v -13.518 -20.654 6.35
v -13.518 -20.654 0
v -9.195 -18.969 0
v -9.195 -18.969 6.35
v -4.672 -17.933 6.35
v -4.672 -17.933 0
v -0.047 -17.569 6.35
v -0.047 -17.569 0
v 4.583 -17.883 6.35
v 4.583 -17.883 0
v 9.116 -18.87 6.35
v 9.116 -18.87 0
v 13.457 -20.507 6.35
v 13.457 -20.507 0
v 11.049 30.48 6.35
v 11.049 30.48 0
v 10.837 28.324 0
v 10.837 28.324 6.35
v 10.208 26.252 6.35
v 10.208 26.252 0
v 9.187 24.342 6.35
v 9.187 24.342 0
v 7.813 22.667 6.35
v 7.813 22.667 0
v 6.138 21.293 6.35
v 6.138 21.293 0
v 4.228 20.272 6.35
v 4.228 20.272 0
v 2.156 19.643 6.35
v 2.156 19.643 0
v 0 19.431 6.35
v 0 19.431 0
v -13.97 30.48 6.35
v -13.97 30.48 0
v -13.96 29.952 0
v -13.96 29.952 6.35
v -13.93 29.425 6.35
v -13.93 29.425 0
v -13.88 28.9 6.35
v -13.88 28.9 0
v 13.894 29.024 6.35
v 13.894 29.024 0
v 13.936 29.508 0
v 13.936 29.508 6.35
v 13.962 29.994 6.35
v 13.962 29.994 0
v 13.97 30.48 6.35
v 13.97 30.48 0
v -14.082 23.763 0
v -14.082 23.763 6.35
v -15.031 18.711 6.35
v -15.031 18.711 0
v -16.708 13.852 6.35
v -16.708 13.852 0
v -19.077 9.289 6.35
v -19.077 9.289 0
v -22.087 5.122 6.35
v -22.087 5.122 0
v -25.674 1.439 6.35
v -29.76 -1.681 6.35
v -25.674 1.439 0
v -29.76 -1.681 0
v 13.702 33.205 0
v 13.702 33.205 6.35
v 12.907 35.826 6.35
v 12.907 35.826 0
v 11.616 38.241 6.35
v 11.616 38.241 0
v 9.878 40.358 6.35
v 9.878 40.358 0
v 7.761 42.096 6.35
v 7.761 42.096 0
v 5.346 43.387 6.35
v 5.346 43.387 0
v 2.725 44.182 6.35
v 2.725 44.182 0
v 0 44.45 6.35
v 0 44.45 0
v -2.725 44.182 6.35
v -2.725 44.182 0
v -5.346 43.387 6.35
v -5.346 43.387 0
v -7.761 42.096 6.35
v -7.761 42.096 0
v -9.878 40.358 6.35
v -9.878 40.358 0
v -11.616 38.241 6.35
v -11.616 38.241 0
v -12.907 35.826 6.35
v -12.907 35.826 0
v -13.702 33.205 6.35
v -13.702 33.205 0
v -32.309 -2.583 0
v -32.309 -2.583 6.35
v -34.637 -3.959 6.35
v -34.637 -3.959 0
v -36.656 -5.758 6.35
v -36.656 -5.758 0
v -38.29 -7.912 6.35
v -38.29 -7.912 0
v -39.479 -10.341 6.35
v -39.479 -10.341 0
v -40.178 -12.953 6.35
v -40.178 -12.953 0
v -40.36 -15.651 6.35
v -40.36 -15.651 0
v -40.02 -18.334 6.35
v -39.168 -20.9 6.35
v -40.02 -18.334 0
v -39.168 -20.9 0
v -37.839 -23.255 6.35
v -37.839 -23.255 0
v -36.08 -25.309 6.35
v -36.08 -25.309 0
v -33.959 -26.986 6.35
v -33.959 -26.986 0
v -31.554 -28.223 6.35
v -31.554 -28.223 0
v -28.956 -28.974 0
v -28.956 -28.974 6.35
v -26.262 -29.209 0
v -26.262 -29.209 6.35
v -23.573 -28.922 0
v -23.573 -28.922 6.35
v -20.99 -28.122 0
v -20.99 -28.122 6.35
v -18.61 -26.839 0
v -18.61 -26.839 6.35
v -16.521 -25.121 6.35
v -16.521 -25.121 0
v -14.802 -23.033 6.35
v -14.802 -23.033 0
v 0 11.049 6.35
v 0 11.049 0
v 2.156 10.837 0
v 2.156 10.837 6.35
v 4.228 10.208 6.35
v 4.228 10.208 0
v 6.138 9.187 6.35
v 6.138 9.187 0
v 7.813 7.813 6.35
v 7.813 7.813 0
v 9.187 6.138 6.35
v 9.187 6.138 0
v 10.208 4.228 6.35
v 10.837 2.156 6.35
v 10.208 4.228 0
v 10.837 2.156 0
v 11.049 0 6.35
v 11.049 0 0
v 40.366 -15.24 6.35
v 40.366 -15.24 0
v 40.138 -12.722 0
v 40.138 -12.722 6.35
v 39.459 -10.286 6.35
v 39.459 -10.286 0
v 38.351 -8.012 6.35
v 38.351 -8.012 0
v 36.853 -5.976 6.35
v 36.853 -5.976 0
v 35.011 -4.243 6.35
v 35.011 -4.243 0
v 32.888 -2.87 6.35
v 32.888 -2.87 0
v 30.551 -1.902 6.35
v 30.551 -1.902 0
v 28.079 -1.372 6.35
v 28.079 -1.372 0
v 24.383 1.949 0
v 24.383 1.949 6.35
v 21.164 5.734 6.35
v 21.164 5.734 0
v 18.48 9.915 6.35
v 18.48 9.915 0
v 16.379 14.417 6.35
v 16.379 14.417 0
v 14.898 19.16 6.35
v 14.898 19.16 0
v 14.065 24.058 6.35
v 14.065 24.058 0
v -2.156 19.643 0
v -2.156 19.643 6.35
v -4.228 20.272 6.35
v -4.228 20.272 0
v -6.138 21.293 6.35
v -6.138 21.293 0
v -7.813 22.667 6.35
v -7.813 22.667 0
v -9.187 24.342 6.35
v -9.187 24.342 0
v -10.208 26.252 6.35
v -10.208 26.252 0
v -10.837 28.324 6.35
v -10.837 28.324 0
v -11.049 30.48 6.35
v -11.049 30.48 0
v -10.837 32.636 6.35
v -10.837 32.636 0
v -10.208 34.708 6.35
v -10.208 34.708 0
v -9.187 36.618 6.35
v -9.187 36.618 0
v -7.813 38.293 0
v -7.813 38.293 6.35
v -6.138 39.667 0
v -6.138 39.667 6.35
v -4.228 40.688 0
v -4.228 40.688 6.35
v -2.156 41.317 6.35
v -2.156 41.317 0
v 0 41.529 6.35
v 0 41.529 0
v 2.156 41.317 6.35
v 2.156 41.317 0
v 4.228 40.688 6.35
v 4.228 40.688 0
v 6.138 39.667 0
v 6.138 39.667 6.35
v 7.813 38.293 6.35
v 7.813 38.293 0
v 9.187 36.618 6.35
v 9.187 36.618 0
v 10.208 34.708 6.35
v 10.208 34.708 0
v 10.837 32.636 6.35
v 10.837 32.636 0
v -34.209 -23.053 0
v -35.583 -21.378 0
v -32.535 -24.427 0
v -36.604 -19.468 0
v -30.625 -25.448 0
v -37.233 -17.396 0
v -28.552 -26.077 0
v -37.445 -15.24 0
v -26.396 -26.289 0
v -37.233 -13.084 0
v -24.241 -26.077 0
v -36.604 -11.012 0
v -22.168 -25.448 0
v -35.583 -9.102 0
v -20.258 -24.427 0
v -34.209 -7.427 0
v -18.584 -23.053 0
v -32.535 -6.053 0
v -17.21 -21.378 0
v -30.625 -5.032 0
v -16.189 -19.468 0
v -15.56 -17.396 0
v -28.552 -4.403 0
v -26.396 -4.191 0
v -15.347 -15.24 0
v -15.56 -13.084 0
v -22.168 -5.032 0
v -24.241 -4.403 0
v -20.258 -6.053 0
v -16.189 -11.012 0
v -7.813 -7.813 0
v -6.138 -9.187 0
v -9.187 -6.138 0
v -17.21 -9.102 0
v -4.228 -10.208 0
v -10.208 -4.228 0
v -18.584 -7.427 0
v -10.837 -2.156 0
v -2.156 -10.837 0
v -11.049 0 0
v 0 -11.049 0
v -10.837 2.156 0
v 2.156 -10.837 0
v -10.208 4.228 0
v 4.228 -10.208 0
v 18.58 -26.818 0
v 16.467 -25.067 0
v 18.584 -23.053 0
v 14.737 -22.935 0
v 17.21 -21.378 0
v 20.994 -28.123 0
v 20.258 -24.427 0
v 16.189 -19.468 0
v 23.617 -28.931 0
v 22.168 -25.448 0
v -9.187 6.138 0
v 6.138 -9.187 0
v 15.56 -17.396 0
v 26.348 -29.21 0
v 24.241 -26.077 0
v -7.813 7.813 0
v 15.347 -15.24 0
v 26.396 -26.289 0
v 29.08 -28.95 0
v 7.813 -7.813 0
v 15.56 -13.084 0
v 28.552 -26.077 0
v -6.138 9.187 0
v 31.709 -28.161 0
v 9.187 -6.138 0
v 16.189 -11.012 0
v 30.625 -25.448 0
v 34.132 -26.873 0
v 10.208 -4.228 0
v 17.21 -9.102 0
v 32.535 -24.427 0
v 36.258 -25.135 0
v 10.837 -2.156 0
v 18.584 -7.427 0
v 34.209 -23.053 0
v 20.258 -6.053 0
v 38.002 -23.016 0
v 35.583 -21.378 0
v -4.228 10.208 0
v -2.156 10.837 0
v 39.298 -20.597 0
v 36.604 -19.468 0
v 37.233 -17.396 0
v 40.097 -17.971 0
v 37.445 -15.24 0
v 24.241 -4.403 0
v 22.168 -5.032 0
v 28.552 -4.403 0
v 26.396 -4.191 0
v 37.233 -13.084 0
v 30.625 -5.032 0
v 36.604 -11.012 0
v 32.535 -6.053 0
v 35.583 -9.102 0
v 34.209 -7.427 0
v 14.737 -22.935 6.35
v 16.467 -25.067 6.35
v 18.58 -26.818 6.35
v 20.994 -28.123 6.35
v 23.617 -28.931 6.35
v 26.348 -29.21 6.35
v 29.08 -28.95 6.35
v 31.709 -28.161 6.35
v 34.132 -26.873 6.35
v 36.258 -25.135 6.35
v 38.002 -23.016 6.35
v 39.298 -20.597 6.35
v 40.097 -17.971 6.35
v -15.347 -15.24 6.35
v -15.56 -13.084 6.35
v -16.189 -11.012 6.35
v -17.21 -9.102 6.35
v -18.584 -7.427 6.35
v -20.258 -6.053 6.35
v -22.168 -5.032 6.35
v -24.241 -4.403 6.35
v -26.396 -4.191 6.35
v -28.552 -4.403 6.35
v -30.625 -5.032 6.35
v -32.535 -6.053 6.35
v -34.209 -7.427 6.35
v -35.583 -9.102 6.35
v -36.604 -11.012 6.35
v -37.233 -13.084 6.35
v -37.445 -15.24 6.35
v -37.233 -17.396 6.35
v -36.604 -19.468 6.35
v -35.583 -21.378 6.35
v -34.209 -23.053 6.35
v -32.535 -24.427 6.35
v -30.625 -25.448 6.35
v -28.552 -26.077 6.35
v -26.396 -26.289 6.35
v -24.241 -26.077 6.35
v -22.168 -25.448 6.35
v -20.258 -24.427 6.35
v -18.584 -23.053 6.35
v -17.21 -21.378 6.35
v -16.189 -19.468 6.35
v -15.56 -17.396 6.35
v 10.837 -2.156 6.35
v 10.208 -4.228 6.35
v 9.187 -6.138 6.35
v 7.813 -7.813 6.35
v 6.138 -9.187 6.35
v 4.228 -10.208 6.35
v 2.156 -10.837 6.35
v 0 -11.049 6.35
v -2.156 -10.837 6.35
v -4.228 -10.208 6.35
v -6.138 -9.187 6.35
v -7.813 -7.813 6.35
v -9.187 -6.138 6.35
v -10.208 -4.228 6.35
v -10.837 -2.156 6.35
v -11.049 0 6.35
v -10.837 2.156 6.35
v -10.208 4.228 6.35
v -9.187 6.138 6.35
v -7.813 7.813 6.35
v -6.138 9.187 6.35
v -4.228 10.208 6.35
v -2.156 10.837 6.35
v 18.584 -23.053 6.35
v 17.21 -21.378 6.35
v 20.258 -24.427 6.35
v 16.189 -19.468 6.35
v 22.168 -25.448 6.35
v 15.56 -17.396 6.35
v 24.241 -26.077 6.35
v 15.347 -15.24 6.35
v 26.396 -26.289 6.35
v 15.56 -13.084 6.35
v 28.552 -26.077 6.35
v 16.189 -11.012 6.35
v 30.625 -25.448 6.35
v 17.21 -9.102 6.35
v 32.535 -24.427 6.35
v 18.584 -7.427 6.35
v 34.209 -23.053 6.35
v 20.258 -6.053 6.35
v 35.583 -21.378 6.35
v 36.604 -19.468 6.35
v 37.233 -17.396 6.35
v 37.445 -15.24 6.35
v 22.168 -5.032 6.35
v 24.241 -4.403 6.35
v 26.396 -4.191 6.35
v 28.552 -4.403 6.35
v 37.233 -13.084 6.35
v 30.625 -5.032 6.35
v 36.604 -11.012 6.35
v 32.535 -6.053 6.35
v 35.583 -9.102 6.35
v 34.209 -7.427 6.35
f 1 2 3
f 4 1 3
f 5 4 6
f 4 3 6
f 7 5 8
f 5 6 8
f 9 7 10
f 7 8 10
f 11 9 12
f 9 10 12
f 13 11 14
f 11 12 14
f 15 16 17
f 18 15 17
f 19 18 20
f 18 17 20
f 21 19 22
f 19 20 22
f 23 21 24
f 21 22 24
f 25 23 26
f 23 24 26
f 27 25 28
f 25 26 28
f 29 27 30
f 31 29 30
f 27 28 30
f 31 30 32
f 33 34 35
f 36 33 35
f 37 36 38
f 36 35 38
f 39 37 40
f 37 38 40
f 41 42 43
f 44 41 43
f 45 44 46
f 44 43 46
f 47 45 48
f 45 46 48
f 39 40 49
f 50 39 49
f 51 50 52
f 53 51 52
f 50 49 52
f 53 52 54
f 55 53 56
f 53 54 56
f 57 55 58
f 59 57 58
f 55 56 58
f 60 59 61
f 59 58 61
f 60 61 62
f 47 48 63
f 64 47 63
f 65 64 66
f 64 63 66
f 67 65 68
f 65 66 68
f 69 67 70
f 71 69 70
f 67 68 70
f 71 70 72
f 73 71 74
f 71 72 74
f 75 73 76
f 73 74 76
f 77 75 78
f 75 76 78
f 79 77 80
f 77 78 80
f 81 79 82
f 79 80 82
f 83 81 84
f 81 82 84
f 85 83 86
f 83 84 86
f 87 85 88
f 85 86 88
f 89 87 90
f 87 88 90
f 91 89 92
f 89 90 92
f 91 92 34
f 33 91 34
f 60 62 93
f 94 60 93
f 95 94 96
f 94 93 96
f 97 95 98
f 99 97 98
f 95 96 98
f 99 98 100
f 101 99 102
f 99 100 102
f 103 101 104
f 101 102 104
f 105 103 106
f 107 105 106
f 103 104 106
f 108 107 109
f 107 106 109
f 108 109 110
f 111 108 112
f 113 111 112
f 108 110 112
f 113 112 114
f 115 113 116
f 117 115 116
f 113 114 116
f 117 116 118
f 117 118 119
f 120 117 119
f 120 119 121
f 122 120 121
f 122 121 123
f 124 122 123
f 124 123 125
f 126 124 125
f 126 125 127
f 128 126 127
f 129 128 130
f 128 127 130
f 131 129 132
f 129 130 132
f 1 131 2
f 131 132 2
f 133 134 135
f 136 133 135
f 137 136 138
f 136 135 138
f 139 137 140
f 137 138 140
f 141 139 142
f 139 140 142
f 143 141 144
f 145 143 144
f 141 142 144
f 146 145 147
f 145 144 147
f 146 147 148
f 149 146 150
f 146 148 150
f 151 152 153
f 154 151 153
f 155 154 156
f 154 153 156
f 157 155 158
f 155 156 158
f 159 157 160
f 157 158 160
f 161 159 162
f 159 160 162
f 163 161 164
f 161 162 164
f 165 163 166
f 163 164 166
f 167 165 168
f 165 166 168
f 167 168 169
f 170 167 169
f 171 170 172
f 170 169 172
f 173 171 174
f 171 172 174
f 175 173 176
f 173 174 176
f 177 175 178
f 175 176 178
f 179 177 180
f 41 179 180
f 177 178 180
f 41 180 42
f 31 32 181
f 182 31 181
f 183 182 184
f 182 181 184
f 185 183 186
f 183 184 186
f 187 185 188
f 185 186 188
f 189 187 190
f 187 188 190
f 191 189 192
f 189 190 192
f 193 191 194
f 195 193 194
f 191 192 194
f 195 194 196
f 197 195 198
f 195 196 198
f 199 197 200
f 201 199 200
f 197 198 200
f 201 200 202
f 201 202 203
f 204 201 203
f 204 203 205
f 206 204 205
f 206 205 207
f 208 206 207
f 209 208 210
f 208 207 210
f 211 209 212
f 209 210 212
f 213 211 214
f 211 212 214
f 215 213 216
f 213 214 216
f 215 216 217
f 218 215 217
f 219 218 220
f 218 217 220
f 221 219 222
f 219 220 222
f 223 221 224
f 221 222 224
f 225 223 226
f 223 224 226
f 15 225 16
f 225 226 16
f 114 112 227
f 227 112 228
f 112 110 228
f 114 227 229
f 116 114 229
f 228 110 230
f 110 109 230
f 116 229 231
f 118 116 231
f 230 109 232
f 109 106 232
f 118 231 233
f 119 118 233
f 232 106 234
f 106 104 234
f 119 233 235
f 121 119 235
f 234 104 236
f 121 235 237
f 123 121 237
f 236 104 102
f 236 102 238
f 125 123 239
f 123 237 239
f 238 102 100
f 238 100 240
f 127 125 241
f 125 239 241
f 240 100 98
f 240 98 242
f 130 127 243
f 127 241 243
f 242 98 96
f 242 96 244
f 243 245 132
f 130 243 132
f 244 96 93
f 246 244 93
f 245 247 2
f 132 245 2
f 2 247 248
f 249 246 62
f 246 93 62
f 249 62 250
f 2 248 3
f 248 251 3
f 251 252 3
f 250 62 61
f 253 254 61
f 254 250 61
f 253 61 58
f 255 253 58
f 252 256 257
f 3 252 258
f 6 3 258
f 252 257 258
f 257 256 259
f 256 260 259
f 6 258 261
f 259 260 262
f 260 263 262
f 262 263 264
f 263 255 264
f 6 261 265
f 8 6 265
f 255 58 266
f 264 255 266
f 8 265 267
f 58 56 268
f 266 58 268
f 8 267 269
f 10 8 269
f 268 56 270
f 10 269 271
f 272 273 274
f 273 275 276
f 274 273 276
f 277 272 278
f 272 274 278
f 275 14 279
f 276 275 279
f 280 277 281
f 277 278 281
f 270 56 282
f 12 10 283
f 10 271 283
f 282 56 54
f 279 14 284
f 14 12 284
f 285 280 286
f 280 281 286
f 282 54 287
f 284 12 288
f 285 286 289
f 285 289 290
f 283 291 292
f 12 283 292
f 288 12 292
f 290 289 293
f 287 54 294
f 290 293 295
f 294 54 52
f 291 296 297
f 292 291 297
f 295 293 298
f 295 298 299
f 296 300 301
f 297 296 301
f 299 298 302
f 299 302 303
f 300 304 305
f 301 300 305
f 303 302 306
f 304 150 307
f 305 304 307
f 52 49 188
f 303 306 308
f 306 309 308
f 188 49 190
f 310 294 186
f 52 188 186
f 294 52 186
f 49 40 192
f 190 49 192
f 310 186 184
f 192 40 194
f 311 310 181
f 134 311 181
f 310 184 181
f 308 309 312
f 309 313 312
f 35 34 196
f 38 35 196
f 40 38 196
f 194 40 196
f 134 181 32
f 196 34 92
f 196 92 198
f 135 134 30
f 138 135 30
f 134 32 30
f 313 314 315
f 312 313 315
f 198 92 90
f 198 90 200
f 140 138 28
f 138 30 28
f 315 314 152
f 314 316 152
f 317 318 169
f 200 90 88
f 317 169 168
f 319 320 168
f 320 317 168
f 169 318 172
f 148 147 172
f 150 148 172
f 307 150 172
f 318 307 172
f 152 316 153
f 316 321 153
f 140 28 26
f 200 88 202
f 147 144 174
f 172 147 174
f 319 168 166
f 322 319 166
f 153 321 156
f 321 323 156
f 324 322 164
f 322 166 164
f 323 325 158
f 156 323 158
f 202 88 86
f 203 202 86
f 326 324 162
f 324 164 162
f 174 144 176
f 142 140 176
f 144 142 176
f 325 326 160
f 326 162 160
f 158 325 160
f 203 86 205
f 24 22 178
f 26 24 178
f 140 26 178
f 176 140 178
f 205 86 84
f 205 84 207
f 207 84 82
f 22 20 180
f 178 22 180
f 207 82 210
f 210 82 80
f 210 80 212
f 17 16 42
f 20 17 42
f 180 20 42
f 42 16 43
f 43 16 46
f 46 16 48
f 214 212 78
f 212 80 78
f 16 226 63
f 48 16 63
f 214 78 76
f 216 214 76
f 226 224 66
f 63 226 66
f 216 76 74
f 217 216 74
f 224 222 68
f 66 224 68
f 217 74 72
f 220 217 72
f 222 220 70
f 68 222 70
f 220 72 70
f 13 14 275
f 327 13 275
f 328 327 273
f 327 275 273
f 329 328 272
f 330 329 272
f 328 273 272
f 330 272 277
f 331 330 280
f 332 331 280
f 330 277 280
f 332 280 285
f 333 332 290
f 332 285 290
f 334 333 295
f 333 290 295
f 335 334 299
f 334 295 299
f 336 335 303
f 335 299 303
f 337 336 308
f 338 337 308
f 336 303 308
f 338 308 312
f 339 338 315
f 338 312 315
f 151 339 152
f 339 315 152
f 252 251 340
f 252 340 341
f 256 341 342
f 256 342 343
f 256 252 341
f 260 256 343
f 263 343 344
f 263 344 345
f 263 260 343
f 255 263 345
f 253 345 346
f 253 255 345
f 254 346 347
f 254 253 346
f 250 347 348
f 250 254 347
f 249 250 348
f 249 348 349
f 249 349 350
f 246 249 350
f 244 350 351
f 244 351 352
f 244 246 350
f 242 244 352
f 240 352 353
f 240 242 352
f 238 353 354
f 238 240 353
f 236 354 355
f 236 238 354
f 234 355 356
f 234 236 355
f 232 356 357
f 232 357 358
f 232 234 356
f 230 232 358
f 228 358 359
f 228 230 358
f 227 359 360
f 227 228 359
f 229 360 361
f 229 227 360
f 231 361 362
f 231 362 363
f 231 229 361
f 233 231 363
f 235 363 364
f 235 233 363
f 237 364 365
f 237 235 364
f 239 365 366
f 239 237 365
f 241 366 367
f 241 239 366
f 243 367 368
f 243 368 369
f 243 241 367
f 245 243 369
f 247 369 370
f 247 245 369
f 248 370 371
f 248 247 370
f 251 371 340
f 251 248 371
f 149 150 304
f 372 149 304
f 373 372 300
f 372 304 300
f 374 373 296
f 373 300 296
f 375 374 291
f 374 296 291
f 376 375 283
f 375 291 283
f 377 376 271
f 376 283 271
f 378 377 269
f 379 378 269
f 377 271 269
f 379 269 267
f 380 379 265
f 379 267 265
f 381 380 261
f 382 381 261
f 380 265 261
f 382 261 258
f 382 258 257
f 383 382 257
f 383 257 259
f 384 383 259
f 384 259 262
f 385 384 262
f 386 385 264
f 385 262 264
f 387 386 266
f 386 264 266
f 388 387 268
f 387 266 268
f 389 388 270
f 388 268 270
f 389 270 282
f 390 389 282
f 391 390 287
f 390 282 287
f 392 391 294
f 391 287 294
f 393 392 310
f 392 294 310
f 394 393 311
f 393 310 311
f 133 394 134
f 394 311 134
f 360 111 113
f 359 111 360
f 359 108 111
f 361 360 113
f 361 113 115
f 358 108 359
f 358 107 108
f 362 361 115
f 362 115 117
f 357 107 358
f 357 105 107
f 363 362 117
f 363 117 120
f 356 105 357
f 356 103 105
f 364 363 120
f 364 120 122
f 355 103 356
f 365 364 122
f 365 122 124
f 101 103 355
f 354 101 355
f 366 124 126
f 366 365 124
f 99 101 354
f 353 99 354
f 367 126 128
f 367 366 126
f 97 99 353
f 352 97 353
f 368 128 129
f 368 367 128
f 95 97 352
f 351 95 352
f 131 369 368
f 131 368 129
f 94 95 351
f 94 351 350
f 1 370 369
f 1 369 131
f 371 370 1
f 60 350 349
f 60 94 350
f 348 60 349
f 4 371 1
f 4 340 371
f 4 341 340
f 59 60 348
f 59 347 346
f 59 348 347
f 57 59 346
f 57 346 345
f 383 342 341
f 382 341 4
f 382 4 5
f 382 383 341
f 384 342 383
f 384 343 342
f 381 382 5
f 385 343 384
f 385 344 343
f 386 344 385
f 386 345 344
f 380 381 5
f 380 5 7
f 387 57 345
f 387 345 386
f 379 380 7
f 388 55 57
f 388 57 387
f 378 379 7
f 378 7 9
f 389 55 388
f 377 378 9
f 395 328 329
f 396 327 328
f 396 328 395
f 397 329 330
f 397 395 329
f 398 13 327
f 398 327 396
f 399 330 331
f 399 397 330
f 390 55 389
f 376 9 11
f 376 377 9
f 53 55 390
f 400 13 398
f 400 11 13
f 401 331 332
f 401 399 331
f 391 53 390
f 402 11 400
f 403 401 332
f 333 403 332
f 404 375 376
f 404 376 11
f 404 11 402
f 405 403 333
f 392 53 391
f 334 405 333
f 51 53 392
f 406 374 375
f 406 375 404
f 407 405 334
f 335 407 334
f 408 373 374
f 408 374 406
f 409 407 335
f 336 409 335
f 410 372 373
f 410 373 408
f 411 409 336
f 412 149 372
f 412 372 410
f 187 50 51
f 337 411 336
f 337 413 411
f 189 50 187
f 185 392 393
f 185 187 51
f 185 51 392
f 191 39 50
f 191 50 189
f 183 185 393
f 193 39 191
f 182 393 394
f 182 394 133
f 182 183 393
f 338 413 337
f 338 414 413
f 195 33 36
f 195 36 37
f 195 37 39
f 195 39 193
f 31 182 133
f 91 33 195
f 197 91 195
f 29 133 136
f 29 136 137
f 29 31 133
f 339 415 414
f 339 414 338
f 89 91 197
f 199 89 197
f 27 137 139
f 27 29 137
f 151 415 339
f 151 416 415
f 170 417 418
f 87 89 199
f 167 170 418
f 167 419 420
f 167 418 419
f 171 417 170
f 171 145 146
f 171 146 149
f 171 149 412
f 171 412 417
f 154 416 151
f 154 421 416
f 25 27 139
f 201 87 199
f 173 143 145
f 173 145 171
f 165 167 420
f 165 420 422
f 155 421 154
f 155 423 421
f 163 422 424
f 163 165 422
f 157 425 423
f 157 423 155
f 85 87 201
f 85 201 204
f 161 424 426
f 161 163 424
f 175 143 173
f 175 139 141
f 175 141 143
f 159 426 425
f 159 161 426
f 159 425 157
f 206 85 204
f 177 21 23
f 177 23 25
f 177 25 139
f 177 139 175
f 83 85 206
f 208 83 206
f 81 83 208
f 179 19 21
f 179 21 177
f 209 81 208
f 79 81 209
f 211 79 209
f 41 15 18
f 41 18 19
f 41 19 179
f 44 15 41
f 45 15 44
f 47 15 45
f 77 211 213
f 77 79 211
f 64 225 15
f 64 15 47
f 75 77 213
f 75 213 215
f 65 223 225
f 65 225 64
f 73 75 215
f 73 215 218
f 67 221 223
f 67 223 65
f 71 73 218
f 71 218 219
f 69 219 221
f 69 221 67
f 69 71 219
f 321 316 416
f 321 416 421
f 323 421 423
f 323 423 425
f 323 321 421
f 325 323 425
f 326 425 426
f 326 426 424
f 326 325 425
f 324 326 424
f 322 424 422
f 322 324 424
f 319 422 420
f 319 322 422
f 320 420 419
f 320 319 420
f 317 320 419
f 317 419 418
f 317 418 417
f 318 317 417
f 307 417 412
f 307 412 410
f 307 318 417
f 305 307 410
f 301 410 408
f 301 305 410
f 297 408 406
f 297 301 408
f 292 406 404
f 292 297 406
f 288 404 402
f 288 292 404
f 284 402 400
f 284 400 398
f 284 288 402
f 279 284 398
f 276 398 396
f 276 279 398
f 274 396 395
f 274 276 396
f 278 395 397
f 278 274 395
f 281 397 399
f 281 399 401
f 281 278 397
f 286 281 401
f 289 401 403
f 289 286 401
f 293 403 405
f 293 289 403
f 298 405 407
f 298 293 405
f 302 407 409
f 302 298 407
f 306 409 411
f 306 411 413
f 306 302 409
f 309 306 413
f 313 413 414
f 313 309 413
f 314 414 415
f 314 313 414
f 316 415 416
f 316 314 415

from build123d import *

# Parameters (mm, degrees)
F0_R     = 11.049
F1_DEPTH = 6.35


with BuildPart() as f1:
    # F0 (on Top) → F1 (new body)
    with BuildSketch(Plane.XY):
        with BuildLine():
            ThreePointArc((0, 11.049), (-7.812823, -7.812823), (11.049, 0))
            ThreePointArc((11.049, 0), (7.812823, 7.812823), (0, 11.049))
        make_face()
        with BuildLine():
            ThreePointArc((13.893866, 29.023504), (9.349162, 20.099534), (0, 16.51))
            ThreePointArc((0, 16.51), (-9.302947, 20.058096), (-13.880375, 28.900097))
            ThreePointArc((-13.880375, 28.900097), (-17.809173, 11.527031), (-29.759522, -1.680845))
            ThreePointArc((-29.759522, -1.680845), (-17.788933, -4.236751), (-12.426454, -15.24))
            ThreePointArc((-12.426454, -15.24), (-12.702084, -18.001363), (-13.518097, -20.653762))
            ThreePointArc((-13.518097, -20.653762), (-0.046654, -17.568603), (13.457498, -20.507288))
            ThreePointArc((13.457498, -20.507288), (15.296029, -6.758169), (28.078999, -1.371693))
            ThreePointArc((28.078999, -1.371693), (17.354133, 12.130747), (13.893866, 29.023504))
        make_face()
        with BuildLine():
            ThreePointArc((0, 11.049), (7.812823, 7.812823), (11.049, 0))
            ThreePointArc((11.049, 0), (-7.812823, -7.812823), (0, 11.049))
        make_face(mode=Mode.SUBTRACT)
        with BuildLine():
            ThreePointArc((11.049, 30.48), (-7.812823, 38.292823), (0, 19.431))
            ThreePointArc((0, 19.431), (7.812823, 22.667177), (11.049, 30.48))
        make_face()
        with BuildLine():
            ThreePointArc((-13.880375, 28.900097), (-9.302947, 20.058096), (0, 16.51))
            ThreePointArc((0, 16.51), (9.349162, 20.099534), (13.893866, 29.023504))
            ThreePointArc((13.893866, 29.023504), (13.924773, 29.752126), (13.97, 30.48))
            ThreePointArc((13.97, 30.48), (0, 44.45), (-13.97, 30.48))
            ThreePointArc((-13.97, 30.48), (-13.916283, 29.690554), (-13.880375, 28.900097))
        make_face()
        with BuildLine():
            ThreePointArc((11.049, 30.48), (7.812823, 22.667177), (0, 19.431))
            ThreePointArc((0, 19.431), (-7.812823, 38.292823), (11.049, 30.48))
        make_face(mode=Mode.SUBTRACT)
        with BuildLine():
            ThreePointArc((-13.97, 30.48), (-13.947576, 29.688778), (-13.880375, 28.900097))
            ThreePointArc((-13.880375, 28.900097), (-13.916283, 29.690554), (-13.97, 30.48))
        make_face()
        with BuildLine():
            ThreePointArc((13.97, 30.48), (13.924773, 29.752126), (13.893866, 29.023504))
            ThreePointArc((13.893866, 29.023504), (13.950954, 29.750758), (13.97, 30.48))
        make_face()
        with BuildLine():
            ThreePointArc((-12.426454, -15.24), (-17.788933, -4.236751), (-29.759522, -1.680845))
            ThreePointArc((-29.759522, -1.680845), (-37.009092, -24.324758), (-13.518097, -20.653762))
            ThreePointArc((-13.518097, -20.653762), (-12.702084, -18.001363), (-12.426454, -15.24))
        make_face()
        with Locations((-26.396454, -15.24)):
            Circle(F0_R, mode=Mode.SUBTRACT)
        with BuildLine():
            ThreePointArc((40.366454, -15.24), (36.852698, -5.975667), (28.078999, -1.371693))
            ThreePointArc((28.078999, -1.371693), (15.296029, -6.758169), (13.457498, -20.507288))
            ThreePointArc((13.457498, -20.507288), (29.080079, -28.949816), (40.366454, -15.24))
        make_face()
        with Locations((26.396454, -15.24)):
            Circle(F0_R, mode=Mode.SUBTRACT)
    extrude(amount=F1_DEPTH)


solid = f1.part
